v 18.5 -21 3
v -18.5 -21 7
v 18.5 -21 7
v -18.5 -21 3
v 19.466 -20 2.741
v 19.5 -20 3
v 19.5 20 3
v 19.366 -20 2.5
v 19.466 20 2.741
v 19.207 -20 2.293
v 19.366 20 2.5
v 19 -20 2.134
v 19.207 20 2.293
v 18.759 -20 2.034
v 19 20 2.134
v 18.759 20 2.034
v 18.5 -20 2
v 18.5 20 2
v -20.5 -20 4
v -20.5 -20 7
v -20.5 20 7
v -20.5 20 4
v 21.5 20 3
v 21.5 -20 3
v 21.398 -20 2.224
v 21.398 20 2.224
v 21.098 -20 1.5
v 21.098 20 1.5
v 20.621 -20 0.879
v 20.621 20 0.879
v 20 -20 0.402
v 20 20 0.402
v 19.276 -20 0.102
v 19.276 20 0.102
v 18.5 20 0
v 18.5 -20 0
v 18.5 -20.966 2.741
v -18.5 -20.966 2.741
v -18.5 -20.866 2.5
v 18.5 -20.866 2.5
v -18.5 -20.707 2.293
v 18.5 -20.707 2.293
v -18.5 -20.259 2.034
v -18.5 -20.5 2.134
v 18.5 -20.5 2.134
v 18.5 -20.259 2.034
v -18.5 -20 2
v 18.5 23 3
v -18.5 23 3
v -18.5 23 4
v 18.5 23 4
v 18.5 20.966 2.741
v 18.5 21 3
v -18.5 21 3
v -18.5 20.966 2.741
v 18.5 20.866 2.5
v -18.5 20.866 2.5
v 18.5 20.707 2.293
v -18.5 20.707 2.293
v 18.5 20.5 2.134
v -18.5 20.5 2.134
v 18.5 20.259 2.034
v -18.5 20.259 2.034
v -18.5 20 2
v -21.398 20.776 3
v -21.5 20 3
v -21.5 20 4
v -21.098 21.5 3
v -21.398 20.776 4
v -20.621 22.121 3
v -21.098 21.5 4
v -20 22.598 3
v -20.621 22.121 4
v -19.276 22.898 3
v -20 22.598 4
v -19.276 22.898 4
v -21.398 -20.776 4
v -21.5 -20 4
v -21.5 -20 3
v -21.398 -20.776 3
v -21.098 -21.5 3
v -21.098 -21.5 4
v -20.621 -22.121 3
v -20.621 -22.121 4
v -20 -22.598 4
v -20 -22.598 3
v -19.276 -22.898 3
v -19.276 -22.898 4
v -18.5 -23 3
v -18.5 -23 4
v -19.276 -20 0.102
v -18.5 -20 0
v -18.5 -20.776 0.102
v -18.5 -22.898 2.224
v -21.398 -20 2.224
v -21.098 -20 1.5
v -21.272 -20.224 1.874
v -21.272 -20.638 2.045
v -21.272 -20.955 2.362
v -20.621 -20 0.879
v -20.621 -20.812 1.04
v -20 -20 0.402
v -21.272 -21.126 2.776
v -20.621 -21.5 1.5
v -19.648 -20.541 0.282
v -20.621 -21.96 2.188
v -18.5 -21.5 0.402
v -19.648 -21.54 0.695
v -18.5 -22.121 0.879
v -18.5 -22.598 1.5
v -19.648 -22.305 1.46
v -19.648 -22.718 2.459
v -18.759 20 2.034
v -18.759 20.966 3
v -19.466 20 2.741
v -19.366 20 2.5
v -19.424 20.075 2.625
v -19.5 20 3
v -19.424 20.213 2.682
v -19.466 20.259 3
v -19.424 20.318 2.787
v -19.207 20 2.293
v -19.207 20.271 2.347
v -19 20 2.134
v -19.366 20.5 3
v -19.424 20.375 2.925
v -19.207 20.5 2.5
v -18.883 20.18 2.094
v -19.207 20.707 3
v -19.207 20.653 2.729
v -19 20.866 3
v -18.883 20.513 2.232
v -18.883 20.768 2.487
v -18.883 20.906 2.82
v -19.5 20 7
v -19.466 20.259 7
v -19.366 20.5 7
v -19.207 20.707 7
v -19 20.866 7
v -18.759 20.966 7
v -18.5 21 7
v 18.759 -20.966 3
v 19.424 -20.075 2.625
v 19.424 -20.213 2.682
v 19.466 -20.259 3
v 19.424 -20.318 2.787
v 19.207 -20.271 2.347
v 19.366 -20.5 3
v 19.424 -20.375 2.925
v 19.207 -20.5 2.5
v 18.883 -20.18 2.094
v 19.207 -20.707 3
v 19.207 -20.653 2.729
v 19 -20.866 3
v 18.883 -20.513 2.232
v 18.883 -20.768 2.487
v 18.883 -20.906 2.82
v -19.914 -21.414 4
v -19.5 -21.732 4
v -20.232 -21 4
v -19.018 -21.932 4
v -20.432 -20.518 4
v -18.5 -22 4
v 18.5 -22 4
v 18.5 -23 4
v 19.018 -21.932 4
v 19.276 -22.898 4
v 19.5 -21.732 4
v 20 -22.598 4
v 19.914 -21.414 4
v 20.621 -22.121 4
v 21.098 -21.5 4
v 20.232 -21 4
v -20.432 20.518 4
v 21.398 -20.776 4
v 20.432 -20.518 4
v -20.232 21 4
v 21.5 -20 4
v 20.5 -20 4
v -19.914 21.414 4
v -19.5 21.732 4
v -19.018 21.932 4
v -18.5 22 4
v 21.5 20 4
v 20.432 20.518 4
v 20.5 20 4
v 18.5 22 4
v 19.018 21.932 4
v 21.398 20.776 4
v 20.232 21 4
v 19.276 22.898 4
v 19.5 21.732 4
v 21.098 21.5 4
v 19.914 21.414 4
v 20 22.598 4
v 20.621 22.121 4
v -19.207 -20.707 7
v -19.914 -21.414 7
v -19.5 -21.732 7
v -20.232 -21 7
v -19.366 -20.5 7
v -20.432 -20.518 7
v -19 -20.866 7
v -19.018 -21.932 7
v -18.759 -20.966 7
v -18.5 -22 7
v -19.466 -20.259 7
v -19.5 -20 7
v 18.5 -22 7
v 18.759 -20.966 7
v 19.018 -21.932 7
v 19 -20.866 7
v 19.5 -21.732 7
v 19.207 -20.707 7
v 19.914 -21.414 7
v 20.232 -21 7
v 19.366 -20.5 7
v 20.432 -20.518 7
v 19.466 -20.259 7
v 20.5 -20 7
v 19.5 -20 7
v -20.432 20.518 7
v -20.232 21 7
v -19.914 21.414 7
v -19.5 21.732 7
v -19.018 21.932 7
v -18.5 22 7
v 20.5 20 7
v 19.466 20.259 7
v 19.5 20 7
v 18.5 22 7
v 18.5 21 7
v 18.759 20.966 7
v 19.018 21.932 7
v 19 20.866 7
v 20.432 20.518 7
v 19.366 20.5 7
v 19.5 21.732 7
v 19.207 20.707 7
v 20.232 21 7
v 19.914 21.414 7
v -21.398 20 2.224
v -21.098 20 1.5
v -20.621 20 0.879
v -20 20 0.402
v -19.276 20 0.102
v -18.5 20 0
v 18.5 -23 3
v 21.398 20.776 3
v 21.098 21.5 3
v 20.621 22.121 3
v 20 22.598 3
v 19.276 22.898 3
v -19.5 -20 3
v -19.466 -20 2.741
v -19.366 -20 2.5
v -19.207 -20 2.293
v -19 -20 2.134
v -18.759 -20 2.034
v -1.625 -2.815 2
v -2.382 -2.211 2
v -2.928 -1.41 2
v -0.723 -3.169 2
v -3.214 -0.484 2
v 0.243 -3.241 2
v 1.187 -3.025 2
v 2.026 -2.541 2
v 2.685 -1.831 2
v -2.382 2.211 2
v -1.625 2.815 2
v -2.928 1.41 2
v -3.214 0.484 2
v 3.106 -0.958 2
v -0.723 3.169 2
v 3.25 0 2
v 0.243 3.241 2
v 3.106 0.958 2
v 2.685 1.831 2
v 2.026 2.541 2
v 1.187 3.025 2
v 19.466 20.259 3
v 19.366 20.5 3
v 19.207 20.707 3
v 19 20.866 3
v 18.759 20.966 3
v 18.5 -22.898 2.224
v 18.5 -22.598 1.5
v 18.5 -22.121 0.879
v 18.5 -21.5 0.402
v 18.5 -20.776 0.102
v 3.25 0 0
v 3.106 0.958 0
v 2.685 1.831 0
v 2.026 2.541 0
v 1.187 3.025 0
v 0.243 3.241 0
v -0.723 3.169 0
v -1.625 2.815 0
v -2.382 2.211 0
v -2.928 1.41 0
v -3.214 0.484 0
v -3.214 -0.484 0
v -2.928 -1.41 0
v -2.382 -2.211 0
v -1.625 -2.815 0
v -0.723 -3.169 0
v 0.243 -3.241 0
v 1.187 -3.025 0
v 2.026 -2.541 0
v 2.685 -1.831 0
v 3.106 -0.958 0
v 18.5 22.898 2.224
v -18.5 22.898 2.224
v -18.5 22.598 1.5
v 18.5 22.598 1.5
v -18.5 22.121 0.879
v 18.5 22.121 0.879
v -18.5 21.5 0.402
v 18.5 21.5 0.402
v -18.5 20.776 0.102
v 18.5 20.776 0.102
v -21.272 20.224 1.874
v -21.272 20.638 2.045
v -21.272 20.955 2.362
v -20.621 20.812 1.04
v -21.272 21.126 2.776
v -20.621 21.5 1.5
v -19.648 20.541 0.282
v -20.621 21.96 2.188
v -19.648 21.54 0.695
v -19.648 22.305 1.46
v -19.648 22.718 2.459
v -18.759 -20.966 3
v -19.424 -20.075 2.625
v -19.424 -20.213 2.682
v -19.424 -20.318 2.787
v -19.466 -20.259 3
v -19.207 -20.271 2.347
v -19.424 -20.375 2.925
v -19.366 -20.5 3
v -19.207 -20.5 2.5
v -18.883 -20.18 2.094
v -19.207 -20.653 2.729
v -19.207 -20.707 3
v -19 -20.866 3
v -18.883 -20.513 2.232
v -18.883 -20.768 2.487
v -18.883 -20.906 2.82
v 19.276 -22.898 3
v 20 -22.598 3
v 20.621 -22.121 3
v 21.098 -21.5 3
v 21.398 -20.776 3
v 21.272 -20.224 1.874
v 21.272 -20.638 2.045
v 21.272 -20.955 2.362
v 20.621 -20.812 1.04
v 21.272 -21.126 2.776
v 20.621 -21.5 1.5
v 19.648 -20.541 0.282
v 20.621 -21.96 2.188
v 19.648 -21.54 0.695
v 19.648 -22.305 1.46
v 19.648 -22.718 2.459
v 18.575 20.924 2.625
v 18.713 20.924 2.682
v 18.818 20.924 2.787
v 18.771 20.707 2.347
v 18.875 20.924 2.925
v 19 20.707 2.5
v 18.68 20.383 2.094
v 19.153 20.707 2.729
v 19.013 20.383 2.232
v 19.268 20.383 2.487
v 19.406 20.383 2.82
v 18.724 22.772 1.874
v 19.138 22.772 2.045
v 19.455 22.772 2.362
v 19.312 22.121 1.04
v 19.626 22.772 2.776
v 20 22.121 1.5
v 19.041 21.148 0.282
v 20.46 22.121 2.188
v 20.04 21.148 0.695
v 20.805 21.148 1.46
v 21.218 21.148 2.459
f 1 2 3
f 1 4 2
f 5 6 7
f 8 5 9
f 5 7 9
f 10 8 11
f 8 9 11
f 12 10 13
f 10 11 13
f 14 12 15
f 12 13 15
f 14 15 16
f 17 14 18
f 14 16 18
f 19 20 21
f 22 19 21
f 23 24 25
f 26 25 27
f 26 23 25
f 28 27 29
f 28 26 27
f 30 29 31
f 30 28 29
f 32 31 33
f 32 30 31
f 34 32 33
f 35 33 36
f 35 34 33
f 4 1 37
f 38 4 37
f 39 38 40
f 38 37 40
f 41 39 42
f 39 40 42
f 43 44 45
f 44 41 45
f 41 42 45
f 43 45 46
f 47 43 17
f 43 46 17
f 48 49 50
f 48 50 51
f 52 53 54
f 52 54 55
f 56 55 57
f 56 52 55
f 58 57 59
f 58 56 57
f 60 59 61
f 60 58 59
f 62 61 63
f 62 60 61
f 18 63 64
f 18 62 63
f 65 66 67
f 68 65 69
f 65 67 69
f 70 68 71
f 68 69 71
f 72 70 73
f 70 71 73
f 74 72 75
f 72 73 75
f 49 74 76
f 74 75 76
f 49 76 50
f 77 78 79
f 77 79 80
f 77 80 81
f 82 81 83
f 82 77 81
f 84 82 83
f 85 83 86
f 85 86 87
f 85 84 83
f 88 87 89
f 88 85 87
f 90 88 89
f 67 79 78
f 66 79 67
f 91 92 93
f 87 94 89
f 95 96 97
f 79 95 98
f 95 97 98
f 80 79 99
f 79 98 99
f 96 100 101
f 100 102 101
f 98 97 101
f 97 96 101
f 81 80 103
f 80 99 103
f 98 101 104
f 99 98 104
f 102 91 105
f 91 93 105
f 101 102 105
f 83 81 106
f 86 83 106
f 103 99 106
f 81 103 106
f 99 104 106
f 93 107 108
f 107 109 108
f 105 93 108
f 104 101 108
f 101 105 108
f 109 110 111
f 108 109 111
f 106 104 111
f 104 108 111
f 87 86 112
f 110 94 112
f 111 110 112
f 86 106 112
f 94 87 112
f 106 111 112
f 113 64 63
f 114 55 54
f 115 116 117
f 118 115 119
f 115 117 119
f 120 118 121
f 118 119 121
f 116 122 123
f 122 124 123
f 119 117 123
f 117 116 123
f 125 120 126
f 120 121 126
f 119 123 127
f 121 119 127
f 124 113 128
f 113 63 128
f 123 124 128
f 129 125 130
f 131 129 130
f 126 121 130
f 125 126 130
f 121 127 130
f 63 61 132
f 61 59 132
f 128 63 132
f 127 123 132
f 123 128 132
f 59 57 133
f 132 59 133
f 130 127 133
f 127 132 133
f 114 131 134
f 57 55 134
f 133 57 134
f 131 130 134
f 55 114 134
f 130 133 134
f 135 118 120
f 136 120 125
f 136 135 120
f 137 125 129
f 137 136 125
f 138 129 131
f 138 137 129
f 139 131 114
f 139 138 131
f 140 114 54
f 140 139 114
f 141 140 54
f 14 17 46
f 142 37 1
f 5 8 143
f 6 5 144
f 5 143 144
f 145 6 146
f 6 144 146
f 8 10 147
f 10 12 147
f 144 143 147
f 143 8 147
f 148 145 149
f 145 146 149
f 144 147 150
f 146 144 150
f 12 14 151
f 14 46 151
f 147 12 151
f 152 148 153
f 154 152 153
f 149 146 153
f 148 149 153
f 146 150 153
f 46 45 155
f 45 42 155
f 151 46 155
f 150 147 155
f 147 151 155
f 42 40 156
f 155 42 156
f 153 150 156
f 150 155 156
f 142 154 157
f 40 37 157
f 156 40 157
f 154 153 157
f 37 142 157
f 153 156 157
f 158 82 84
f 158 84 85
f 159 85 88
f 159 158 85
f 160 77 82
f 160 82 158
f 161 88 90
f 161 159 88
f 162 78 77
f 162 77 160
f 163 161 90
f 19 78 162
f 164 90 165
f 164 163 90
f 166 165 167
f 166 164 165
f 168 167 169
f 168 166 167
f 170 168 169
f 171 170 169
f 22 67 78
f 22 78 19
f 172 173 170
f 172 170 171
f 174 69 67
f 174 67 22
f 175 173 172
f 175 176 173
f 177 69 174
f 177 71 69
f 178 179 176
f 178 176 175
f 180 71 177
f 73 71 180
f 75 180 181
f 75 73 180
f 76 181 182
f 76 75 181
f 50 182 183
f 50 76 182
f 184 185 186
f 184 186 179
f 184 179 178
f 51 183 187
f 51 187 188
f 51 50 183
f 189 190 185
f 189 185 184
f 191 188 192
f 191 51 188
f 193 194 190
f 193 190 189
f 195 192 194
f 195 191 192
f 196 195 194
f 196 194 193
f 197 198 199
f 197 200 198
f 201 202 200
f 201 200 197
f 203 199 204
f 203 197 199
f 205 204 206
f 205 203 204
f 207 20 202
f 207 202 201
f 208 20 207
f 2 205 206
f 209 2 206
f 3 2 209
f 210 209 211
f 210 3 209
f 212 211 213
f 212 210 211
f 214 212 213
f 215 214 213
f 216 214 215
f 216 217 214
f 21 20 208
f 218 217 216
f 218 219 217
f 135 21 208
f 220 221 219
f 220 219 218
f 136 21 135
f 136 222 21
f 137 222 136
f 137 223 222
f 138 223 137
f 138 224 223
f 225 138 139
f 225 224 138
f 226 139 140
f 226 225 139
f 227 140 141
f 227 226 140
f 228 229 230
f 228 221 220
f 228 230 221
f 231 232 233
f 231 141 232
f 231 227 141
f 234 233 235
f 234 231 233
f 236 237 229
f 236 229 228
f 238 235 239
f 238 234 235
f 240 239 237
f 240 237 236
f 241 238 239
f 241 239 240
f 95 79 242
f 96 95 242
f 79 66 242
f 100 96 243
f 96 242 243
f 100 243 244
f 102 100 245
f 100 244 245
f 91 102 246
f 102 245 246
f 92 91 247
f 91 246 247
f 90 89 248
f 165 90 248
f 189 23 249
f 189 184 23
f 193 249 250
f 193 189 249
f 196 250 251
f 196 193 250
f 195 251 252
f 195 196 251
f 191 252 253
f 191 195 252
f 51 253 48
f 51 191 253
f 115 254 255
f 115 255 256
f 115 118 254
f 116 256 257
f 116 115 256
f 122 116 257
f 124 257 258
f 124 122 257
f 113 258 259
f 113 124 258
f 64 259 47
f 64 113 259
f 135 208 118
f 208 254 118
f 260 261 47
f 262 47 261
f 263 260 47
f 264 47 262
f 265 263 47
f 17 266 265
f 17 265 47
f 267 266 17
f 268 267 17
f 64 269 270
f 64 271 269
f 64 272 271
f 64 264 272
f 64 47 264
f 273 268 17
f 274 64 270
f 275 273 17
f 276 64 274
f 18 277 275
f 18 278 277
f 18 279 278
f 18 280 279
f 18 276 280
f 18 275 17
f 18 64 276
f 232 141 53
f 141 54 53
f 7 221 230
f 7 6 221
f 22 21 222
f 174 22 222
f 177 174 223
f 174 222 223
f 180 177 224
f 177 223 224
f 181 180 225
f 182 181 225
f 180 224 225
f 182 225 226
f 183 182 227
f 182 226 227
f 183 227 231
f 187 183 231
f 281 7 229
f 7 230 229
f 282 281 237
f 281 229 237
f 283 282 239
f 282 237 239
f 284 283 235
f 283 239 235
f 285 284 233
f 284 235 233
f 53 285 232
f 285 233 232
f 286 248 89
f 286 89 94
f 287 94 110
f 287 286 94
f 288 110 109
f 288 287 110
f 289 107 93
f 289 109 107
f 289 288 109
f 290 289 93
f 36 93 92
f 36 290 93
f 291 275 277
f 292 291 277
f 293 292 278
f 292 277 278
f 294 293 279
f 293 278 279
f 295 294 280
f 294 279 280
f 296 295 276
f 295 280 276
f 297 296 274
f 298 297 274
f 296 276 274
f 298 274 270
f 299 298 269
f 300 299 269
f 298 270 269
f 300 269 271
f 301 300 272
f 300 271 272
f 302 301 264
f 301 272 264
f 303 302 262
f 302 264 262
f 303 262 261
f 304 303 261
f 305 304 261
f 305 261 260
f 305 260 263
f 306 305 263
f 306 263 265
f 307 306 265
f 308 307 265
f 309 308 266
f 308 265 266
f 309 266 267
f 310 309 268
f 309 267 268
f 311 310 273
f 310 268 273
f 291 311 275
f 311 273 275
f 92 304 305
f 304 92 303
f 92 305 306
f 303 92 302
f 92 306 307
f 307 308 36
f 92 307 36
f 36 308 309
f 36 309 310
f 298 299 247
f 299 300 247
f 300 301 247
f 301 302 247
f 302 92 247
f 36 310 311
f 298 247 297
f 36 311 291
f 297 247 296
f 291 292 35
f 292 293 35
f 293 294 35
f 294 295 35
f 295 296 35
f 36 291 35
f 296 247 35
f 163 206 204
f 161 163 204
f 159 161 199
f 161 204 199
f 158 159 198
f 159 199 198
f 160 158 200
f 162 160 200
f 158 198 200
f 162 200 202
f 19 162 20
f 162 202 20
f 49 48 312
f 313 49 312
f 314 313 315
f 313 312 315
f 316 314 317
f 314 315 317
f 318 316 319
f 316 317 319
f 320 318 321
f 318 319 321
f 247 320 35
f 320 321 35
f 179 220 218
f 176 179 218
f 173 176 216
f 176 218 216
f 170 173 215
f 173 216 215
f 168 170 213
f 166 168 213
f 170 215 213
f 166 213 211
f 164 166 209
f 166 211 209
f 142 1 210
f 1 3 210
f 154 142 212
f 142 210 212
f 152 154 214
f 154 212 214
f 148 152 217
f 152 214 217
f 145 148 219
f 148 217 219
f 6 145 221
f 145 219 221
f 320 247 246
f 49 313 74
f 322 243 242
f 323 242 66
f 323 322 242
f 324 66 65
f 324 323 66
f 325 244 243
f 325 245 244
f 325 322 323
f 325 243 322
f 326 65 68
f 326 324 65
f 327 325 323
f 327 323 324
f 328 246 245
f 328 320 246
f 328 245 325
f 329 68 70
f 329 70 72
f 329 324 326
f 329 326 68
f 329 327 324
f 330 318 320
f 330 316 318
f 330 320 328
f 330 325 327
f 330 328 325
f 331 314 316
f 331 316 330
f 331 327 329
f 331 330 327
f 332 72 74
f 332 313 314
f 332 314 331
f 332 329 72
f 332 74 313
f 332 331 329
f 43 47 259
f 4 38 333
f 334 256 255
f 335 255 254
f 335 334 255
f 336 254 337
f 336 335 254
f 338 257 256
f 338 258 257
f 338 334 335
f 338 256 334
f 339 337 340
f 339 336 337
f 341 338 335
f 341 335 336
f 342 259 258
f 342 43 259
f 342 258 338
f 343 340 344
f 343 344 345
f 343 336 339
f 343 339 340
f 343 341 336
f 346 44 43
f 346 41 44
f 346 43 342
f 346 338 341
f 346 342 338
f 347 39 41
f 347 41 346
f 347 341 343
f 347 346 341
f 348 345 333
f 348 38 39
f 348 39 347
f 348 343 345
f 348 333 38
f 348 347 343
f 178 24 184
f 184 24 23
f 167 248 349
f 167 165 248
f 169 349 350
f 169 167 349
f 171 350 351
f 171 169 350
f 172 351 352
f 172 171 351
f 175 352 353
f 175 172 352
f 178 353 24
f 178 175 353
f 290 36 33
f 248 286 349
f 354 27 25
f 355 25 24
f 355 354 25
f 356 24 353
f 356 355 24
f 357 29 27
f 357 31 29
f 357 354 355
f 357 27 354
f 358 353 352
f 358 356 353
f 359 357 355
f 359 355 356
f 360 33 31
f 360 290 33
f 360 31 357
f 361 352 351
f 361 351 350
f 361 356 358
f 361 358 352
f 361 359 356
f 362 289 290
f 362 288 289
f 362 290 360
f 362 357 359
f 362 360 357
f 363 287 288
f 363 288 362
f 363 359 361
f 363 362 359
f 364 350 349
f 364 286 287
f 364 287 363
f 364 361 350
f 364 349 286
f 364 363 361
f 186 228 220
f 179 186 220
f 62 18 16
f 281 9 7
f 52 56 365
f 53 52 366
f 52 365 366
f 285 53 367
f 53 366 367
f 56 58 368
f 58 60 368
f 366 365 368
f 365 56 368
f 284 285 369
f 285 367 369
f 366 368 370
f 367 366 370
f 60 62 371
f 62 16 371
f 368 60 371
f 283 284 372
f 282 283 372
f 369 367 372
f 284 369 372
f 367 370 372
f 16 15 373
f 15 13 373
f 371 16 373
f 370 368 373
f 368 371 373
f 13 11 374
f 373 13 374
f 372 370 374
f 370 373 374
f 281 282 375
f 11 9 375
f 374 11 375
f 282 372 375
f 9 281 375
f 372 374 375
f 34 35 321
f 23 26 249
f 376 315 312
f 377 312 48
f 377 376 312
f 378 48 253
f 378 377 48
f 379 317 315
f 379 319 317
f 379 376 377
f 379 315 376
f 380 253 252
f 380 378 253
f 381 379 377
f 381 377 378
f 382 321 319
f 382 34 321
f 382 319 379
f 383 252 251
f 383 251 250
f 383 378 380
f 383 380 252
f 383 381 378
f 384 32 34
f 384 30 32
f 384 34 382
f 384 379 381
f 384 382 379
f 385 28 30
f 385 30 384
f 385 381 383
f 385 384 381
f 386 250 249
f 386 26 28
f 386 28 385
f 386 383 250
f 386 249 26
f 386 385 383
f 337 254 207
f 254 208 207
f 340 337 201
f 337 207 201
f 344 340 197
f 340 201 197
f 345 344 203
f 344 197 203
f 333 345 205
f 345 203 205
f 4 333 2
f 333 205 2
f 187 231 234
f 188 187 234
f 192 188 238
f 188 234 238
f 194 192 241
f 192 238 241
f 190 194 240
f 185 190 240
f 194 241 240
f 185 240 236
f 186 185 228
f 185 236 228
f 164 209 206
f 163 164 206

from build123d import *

# Parameters (mm, degrees)
F0_W     = 43
F0_H     = 46
F1_DEPTH = 7
F2_R     = 3
F3_T     = -2
F4_R     = 3.25
F5_DEPTH = 2
F6_W     = 51.836722
F6_H     = 50.070026
F7_DEPTH = 3


with BuildPart() as f1:
    # F0 (on Top) → F1 (new body)
    with BuildSketch(Plane.XY):
        Rectangle(F0_W, F0_H)
    extrude(amount=F1_DEPTH)

    # F2
    f2_edges = [f1.edges().sort_by_distance(p)[0] for p in [
        (0, -23, 0),
        (21.5, 0, 0),
        (0, 23, 0),
        (-21.5, 0, 0),
        (21.5, 23, 3.5),
        (21.5, -23, 3.5),
        (-21.5, 23, 3.5),
        (-21.5, -23, 3.5),
    ]]
    fillet(f2_edges, radius=F2_R)

    # F3
    f3_openings = [f1.faces().sort_by_distance(p)[0] for p in [
        (0, 0, 7),
    ]]
    offset(amount=F3_T, openings=f3_openings)

    # F4 (on face) → F5 (cut, through all)
    with BuildSketch(Plane.XY.offset(2)):
        Circle(F4_R)
    extrude(amount=-F5_DEPTH, mode=Mode.SUBTRACT)

    # F6 (on face) → F7 (cut)
    with BuildSketch(Plane.XY.offset(7)):
        Rectangle(F6_W, F6_H)
        with BuildLine():
            ThreePointArc((18.5, 22), (19.914214, 21.414214), (20.5, 20))
            Line((20.5, 20), (20.5, -20))
            ThreePointArc((20.5, -20), (19.914214, -21.414214), (18.5, -22))
            Line((18.5, -22), (-18.5, -22))
            ThreePointArc((-18.5, -22), (-19.914214, -21.414214), (-20.5, -20))
            Line((-20.5, -20), (-20.5, 20))
            ThreePointArc((-20.5, 20), (-19.914214, 21.414214), (-18.5, 22))
            Line((-18.5, 22), (18.5, 22))
        make_face(mode=Mode.SUBTRACT)
    extrude(amount=-F7_DEPTH, mode=Mode.SUBTRACT)


solid = f1.part
